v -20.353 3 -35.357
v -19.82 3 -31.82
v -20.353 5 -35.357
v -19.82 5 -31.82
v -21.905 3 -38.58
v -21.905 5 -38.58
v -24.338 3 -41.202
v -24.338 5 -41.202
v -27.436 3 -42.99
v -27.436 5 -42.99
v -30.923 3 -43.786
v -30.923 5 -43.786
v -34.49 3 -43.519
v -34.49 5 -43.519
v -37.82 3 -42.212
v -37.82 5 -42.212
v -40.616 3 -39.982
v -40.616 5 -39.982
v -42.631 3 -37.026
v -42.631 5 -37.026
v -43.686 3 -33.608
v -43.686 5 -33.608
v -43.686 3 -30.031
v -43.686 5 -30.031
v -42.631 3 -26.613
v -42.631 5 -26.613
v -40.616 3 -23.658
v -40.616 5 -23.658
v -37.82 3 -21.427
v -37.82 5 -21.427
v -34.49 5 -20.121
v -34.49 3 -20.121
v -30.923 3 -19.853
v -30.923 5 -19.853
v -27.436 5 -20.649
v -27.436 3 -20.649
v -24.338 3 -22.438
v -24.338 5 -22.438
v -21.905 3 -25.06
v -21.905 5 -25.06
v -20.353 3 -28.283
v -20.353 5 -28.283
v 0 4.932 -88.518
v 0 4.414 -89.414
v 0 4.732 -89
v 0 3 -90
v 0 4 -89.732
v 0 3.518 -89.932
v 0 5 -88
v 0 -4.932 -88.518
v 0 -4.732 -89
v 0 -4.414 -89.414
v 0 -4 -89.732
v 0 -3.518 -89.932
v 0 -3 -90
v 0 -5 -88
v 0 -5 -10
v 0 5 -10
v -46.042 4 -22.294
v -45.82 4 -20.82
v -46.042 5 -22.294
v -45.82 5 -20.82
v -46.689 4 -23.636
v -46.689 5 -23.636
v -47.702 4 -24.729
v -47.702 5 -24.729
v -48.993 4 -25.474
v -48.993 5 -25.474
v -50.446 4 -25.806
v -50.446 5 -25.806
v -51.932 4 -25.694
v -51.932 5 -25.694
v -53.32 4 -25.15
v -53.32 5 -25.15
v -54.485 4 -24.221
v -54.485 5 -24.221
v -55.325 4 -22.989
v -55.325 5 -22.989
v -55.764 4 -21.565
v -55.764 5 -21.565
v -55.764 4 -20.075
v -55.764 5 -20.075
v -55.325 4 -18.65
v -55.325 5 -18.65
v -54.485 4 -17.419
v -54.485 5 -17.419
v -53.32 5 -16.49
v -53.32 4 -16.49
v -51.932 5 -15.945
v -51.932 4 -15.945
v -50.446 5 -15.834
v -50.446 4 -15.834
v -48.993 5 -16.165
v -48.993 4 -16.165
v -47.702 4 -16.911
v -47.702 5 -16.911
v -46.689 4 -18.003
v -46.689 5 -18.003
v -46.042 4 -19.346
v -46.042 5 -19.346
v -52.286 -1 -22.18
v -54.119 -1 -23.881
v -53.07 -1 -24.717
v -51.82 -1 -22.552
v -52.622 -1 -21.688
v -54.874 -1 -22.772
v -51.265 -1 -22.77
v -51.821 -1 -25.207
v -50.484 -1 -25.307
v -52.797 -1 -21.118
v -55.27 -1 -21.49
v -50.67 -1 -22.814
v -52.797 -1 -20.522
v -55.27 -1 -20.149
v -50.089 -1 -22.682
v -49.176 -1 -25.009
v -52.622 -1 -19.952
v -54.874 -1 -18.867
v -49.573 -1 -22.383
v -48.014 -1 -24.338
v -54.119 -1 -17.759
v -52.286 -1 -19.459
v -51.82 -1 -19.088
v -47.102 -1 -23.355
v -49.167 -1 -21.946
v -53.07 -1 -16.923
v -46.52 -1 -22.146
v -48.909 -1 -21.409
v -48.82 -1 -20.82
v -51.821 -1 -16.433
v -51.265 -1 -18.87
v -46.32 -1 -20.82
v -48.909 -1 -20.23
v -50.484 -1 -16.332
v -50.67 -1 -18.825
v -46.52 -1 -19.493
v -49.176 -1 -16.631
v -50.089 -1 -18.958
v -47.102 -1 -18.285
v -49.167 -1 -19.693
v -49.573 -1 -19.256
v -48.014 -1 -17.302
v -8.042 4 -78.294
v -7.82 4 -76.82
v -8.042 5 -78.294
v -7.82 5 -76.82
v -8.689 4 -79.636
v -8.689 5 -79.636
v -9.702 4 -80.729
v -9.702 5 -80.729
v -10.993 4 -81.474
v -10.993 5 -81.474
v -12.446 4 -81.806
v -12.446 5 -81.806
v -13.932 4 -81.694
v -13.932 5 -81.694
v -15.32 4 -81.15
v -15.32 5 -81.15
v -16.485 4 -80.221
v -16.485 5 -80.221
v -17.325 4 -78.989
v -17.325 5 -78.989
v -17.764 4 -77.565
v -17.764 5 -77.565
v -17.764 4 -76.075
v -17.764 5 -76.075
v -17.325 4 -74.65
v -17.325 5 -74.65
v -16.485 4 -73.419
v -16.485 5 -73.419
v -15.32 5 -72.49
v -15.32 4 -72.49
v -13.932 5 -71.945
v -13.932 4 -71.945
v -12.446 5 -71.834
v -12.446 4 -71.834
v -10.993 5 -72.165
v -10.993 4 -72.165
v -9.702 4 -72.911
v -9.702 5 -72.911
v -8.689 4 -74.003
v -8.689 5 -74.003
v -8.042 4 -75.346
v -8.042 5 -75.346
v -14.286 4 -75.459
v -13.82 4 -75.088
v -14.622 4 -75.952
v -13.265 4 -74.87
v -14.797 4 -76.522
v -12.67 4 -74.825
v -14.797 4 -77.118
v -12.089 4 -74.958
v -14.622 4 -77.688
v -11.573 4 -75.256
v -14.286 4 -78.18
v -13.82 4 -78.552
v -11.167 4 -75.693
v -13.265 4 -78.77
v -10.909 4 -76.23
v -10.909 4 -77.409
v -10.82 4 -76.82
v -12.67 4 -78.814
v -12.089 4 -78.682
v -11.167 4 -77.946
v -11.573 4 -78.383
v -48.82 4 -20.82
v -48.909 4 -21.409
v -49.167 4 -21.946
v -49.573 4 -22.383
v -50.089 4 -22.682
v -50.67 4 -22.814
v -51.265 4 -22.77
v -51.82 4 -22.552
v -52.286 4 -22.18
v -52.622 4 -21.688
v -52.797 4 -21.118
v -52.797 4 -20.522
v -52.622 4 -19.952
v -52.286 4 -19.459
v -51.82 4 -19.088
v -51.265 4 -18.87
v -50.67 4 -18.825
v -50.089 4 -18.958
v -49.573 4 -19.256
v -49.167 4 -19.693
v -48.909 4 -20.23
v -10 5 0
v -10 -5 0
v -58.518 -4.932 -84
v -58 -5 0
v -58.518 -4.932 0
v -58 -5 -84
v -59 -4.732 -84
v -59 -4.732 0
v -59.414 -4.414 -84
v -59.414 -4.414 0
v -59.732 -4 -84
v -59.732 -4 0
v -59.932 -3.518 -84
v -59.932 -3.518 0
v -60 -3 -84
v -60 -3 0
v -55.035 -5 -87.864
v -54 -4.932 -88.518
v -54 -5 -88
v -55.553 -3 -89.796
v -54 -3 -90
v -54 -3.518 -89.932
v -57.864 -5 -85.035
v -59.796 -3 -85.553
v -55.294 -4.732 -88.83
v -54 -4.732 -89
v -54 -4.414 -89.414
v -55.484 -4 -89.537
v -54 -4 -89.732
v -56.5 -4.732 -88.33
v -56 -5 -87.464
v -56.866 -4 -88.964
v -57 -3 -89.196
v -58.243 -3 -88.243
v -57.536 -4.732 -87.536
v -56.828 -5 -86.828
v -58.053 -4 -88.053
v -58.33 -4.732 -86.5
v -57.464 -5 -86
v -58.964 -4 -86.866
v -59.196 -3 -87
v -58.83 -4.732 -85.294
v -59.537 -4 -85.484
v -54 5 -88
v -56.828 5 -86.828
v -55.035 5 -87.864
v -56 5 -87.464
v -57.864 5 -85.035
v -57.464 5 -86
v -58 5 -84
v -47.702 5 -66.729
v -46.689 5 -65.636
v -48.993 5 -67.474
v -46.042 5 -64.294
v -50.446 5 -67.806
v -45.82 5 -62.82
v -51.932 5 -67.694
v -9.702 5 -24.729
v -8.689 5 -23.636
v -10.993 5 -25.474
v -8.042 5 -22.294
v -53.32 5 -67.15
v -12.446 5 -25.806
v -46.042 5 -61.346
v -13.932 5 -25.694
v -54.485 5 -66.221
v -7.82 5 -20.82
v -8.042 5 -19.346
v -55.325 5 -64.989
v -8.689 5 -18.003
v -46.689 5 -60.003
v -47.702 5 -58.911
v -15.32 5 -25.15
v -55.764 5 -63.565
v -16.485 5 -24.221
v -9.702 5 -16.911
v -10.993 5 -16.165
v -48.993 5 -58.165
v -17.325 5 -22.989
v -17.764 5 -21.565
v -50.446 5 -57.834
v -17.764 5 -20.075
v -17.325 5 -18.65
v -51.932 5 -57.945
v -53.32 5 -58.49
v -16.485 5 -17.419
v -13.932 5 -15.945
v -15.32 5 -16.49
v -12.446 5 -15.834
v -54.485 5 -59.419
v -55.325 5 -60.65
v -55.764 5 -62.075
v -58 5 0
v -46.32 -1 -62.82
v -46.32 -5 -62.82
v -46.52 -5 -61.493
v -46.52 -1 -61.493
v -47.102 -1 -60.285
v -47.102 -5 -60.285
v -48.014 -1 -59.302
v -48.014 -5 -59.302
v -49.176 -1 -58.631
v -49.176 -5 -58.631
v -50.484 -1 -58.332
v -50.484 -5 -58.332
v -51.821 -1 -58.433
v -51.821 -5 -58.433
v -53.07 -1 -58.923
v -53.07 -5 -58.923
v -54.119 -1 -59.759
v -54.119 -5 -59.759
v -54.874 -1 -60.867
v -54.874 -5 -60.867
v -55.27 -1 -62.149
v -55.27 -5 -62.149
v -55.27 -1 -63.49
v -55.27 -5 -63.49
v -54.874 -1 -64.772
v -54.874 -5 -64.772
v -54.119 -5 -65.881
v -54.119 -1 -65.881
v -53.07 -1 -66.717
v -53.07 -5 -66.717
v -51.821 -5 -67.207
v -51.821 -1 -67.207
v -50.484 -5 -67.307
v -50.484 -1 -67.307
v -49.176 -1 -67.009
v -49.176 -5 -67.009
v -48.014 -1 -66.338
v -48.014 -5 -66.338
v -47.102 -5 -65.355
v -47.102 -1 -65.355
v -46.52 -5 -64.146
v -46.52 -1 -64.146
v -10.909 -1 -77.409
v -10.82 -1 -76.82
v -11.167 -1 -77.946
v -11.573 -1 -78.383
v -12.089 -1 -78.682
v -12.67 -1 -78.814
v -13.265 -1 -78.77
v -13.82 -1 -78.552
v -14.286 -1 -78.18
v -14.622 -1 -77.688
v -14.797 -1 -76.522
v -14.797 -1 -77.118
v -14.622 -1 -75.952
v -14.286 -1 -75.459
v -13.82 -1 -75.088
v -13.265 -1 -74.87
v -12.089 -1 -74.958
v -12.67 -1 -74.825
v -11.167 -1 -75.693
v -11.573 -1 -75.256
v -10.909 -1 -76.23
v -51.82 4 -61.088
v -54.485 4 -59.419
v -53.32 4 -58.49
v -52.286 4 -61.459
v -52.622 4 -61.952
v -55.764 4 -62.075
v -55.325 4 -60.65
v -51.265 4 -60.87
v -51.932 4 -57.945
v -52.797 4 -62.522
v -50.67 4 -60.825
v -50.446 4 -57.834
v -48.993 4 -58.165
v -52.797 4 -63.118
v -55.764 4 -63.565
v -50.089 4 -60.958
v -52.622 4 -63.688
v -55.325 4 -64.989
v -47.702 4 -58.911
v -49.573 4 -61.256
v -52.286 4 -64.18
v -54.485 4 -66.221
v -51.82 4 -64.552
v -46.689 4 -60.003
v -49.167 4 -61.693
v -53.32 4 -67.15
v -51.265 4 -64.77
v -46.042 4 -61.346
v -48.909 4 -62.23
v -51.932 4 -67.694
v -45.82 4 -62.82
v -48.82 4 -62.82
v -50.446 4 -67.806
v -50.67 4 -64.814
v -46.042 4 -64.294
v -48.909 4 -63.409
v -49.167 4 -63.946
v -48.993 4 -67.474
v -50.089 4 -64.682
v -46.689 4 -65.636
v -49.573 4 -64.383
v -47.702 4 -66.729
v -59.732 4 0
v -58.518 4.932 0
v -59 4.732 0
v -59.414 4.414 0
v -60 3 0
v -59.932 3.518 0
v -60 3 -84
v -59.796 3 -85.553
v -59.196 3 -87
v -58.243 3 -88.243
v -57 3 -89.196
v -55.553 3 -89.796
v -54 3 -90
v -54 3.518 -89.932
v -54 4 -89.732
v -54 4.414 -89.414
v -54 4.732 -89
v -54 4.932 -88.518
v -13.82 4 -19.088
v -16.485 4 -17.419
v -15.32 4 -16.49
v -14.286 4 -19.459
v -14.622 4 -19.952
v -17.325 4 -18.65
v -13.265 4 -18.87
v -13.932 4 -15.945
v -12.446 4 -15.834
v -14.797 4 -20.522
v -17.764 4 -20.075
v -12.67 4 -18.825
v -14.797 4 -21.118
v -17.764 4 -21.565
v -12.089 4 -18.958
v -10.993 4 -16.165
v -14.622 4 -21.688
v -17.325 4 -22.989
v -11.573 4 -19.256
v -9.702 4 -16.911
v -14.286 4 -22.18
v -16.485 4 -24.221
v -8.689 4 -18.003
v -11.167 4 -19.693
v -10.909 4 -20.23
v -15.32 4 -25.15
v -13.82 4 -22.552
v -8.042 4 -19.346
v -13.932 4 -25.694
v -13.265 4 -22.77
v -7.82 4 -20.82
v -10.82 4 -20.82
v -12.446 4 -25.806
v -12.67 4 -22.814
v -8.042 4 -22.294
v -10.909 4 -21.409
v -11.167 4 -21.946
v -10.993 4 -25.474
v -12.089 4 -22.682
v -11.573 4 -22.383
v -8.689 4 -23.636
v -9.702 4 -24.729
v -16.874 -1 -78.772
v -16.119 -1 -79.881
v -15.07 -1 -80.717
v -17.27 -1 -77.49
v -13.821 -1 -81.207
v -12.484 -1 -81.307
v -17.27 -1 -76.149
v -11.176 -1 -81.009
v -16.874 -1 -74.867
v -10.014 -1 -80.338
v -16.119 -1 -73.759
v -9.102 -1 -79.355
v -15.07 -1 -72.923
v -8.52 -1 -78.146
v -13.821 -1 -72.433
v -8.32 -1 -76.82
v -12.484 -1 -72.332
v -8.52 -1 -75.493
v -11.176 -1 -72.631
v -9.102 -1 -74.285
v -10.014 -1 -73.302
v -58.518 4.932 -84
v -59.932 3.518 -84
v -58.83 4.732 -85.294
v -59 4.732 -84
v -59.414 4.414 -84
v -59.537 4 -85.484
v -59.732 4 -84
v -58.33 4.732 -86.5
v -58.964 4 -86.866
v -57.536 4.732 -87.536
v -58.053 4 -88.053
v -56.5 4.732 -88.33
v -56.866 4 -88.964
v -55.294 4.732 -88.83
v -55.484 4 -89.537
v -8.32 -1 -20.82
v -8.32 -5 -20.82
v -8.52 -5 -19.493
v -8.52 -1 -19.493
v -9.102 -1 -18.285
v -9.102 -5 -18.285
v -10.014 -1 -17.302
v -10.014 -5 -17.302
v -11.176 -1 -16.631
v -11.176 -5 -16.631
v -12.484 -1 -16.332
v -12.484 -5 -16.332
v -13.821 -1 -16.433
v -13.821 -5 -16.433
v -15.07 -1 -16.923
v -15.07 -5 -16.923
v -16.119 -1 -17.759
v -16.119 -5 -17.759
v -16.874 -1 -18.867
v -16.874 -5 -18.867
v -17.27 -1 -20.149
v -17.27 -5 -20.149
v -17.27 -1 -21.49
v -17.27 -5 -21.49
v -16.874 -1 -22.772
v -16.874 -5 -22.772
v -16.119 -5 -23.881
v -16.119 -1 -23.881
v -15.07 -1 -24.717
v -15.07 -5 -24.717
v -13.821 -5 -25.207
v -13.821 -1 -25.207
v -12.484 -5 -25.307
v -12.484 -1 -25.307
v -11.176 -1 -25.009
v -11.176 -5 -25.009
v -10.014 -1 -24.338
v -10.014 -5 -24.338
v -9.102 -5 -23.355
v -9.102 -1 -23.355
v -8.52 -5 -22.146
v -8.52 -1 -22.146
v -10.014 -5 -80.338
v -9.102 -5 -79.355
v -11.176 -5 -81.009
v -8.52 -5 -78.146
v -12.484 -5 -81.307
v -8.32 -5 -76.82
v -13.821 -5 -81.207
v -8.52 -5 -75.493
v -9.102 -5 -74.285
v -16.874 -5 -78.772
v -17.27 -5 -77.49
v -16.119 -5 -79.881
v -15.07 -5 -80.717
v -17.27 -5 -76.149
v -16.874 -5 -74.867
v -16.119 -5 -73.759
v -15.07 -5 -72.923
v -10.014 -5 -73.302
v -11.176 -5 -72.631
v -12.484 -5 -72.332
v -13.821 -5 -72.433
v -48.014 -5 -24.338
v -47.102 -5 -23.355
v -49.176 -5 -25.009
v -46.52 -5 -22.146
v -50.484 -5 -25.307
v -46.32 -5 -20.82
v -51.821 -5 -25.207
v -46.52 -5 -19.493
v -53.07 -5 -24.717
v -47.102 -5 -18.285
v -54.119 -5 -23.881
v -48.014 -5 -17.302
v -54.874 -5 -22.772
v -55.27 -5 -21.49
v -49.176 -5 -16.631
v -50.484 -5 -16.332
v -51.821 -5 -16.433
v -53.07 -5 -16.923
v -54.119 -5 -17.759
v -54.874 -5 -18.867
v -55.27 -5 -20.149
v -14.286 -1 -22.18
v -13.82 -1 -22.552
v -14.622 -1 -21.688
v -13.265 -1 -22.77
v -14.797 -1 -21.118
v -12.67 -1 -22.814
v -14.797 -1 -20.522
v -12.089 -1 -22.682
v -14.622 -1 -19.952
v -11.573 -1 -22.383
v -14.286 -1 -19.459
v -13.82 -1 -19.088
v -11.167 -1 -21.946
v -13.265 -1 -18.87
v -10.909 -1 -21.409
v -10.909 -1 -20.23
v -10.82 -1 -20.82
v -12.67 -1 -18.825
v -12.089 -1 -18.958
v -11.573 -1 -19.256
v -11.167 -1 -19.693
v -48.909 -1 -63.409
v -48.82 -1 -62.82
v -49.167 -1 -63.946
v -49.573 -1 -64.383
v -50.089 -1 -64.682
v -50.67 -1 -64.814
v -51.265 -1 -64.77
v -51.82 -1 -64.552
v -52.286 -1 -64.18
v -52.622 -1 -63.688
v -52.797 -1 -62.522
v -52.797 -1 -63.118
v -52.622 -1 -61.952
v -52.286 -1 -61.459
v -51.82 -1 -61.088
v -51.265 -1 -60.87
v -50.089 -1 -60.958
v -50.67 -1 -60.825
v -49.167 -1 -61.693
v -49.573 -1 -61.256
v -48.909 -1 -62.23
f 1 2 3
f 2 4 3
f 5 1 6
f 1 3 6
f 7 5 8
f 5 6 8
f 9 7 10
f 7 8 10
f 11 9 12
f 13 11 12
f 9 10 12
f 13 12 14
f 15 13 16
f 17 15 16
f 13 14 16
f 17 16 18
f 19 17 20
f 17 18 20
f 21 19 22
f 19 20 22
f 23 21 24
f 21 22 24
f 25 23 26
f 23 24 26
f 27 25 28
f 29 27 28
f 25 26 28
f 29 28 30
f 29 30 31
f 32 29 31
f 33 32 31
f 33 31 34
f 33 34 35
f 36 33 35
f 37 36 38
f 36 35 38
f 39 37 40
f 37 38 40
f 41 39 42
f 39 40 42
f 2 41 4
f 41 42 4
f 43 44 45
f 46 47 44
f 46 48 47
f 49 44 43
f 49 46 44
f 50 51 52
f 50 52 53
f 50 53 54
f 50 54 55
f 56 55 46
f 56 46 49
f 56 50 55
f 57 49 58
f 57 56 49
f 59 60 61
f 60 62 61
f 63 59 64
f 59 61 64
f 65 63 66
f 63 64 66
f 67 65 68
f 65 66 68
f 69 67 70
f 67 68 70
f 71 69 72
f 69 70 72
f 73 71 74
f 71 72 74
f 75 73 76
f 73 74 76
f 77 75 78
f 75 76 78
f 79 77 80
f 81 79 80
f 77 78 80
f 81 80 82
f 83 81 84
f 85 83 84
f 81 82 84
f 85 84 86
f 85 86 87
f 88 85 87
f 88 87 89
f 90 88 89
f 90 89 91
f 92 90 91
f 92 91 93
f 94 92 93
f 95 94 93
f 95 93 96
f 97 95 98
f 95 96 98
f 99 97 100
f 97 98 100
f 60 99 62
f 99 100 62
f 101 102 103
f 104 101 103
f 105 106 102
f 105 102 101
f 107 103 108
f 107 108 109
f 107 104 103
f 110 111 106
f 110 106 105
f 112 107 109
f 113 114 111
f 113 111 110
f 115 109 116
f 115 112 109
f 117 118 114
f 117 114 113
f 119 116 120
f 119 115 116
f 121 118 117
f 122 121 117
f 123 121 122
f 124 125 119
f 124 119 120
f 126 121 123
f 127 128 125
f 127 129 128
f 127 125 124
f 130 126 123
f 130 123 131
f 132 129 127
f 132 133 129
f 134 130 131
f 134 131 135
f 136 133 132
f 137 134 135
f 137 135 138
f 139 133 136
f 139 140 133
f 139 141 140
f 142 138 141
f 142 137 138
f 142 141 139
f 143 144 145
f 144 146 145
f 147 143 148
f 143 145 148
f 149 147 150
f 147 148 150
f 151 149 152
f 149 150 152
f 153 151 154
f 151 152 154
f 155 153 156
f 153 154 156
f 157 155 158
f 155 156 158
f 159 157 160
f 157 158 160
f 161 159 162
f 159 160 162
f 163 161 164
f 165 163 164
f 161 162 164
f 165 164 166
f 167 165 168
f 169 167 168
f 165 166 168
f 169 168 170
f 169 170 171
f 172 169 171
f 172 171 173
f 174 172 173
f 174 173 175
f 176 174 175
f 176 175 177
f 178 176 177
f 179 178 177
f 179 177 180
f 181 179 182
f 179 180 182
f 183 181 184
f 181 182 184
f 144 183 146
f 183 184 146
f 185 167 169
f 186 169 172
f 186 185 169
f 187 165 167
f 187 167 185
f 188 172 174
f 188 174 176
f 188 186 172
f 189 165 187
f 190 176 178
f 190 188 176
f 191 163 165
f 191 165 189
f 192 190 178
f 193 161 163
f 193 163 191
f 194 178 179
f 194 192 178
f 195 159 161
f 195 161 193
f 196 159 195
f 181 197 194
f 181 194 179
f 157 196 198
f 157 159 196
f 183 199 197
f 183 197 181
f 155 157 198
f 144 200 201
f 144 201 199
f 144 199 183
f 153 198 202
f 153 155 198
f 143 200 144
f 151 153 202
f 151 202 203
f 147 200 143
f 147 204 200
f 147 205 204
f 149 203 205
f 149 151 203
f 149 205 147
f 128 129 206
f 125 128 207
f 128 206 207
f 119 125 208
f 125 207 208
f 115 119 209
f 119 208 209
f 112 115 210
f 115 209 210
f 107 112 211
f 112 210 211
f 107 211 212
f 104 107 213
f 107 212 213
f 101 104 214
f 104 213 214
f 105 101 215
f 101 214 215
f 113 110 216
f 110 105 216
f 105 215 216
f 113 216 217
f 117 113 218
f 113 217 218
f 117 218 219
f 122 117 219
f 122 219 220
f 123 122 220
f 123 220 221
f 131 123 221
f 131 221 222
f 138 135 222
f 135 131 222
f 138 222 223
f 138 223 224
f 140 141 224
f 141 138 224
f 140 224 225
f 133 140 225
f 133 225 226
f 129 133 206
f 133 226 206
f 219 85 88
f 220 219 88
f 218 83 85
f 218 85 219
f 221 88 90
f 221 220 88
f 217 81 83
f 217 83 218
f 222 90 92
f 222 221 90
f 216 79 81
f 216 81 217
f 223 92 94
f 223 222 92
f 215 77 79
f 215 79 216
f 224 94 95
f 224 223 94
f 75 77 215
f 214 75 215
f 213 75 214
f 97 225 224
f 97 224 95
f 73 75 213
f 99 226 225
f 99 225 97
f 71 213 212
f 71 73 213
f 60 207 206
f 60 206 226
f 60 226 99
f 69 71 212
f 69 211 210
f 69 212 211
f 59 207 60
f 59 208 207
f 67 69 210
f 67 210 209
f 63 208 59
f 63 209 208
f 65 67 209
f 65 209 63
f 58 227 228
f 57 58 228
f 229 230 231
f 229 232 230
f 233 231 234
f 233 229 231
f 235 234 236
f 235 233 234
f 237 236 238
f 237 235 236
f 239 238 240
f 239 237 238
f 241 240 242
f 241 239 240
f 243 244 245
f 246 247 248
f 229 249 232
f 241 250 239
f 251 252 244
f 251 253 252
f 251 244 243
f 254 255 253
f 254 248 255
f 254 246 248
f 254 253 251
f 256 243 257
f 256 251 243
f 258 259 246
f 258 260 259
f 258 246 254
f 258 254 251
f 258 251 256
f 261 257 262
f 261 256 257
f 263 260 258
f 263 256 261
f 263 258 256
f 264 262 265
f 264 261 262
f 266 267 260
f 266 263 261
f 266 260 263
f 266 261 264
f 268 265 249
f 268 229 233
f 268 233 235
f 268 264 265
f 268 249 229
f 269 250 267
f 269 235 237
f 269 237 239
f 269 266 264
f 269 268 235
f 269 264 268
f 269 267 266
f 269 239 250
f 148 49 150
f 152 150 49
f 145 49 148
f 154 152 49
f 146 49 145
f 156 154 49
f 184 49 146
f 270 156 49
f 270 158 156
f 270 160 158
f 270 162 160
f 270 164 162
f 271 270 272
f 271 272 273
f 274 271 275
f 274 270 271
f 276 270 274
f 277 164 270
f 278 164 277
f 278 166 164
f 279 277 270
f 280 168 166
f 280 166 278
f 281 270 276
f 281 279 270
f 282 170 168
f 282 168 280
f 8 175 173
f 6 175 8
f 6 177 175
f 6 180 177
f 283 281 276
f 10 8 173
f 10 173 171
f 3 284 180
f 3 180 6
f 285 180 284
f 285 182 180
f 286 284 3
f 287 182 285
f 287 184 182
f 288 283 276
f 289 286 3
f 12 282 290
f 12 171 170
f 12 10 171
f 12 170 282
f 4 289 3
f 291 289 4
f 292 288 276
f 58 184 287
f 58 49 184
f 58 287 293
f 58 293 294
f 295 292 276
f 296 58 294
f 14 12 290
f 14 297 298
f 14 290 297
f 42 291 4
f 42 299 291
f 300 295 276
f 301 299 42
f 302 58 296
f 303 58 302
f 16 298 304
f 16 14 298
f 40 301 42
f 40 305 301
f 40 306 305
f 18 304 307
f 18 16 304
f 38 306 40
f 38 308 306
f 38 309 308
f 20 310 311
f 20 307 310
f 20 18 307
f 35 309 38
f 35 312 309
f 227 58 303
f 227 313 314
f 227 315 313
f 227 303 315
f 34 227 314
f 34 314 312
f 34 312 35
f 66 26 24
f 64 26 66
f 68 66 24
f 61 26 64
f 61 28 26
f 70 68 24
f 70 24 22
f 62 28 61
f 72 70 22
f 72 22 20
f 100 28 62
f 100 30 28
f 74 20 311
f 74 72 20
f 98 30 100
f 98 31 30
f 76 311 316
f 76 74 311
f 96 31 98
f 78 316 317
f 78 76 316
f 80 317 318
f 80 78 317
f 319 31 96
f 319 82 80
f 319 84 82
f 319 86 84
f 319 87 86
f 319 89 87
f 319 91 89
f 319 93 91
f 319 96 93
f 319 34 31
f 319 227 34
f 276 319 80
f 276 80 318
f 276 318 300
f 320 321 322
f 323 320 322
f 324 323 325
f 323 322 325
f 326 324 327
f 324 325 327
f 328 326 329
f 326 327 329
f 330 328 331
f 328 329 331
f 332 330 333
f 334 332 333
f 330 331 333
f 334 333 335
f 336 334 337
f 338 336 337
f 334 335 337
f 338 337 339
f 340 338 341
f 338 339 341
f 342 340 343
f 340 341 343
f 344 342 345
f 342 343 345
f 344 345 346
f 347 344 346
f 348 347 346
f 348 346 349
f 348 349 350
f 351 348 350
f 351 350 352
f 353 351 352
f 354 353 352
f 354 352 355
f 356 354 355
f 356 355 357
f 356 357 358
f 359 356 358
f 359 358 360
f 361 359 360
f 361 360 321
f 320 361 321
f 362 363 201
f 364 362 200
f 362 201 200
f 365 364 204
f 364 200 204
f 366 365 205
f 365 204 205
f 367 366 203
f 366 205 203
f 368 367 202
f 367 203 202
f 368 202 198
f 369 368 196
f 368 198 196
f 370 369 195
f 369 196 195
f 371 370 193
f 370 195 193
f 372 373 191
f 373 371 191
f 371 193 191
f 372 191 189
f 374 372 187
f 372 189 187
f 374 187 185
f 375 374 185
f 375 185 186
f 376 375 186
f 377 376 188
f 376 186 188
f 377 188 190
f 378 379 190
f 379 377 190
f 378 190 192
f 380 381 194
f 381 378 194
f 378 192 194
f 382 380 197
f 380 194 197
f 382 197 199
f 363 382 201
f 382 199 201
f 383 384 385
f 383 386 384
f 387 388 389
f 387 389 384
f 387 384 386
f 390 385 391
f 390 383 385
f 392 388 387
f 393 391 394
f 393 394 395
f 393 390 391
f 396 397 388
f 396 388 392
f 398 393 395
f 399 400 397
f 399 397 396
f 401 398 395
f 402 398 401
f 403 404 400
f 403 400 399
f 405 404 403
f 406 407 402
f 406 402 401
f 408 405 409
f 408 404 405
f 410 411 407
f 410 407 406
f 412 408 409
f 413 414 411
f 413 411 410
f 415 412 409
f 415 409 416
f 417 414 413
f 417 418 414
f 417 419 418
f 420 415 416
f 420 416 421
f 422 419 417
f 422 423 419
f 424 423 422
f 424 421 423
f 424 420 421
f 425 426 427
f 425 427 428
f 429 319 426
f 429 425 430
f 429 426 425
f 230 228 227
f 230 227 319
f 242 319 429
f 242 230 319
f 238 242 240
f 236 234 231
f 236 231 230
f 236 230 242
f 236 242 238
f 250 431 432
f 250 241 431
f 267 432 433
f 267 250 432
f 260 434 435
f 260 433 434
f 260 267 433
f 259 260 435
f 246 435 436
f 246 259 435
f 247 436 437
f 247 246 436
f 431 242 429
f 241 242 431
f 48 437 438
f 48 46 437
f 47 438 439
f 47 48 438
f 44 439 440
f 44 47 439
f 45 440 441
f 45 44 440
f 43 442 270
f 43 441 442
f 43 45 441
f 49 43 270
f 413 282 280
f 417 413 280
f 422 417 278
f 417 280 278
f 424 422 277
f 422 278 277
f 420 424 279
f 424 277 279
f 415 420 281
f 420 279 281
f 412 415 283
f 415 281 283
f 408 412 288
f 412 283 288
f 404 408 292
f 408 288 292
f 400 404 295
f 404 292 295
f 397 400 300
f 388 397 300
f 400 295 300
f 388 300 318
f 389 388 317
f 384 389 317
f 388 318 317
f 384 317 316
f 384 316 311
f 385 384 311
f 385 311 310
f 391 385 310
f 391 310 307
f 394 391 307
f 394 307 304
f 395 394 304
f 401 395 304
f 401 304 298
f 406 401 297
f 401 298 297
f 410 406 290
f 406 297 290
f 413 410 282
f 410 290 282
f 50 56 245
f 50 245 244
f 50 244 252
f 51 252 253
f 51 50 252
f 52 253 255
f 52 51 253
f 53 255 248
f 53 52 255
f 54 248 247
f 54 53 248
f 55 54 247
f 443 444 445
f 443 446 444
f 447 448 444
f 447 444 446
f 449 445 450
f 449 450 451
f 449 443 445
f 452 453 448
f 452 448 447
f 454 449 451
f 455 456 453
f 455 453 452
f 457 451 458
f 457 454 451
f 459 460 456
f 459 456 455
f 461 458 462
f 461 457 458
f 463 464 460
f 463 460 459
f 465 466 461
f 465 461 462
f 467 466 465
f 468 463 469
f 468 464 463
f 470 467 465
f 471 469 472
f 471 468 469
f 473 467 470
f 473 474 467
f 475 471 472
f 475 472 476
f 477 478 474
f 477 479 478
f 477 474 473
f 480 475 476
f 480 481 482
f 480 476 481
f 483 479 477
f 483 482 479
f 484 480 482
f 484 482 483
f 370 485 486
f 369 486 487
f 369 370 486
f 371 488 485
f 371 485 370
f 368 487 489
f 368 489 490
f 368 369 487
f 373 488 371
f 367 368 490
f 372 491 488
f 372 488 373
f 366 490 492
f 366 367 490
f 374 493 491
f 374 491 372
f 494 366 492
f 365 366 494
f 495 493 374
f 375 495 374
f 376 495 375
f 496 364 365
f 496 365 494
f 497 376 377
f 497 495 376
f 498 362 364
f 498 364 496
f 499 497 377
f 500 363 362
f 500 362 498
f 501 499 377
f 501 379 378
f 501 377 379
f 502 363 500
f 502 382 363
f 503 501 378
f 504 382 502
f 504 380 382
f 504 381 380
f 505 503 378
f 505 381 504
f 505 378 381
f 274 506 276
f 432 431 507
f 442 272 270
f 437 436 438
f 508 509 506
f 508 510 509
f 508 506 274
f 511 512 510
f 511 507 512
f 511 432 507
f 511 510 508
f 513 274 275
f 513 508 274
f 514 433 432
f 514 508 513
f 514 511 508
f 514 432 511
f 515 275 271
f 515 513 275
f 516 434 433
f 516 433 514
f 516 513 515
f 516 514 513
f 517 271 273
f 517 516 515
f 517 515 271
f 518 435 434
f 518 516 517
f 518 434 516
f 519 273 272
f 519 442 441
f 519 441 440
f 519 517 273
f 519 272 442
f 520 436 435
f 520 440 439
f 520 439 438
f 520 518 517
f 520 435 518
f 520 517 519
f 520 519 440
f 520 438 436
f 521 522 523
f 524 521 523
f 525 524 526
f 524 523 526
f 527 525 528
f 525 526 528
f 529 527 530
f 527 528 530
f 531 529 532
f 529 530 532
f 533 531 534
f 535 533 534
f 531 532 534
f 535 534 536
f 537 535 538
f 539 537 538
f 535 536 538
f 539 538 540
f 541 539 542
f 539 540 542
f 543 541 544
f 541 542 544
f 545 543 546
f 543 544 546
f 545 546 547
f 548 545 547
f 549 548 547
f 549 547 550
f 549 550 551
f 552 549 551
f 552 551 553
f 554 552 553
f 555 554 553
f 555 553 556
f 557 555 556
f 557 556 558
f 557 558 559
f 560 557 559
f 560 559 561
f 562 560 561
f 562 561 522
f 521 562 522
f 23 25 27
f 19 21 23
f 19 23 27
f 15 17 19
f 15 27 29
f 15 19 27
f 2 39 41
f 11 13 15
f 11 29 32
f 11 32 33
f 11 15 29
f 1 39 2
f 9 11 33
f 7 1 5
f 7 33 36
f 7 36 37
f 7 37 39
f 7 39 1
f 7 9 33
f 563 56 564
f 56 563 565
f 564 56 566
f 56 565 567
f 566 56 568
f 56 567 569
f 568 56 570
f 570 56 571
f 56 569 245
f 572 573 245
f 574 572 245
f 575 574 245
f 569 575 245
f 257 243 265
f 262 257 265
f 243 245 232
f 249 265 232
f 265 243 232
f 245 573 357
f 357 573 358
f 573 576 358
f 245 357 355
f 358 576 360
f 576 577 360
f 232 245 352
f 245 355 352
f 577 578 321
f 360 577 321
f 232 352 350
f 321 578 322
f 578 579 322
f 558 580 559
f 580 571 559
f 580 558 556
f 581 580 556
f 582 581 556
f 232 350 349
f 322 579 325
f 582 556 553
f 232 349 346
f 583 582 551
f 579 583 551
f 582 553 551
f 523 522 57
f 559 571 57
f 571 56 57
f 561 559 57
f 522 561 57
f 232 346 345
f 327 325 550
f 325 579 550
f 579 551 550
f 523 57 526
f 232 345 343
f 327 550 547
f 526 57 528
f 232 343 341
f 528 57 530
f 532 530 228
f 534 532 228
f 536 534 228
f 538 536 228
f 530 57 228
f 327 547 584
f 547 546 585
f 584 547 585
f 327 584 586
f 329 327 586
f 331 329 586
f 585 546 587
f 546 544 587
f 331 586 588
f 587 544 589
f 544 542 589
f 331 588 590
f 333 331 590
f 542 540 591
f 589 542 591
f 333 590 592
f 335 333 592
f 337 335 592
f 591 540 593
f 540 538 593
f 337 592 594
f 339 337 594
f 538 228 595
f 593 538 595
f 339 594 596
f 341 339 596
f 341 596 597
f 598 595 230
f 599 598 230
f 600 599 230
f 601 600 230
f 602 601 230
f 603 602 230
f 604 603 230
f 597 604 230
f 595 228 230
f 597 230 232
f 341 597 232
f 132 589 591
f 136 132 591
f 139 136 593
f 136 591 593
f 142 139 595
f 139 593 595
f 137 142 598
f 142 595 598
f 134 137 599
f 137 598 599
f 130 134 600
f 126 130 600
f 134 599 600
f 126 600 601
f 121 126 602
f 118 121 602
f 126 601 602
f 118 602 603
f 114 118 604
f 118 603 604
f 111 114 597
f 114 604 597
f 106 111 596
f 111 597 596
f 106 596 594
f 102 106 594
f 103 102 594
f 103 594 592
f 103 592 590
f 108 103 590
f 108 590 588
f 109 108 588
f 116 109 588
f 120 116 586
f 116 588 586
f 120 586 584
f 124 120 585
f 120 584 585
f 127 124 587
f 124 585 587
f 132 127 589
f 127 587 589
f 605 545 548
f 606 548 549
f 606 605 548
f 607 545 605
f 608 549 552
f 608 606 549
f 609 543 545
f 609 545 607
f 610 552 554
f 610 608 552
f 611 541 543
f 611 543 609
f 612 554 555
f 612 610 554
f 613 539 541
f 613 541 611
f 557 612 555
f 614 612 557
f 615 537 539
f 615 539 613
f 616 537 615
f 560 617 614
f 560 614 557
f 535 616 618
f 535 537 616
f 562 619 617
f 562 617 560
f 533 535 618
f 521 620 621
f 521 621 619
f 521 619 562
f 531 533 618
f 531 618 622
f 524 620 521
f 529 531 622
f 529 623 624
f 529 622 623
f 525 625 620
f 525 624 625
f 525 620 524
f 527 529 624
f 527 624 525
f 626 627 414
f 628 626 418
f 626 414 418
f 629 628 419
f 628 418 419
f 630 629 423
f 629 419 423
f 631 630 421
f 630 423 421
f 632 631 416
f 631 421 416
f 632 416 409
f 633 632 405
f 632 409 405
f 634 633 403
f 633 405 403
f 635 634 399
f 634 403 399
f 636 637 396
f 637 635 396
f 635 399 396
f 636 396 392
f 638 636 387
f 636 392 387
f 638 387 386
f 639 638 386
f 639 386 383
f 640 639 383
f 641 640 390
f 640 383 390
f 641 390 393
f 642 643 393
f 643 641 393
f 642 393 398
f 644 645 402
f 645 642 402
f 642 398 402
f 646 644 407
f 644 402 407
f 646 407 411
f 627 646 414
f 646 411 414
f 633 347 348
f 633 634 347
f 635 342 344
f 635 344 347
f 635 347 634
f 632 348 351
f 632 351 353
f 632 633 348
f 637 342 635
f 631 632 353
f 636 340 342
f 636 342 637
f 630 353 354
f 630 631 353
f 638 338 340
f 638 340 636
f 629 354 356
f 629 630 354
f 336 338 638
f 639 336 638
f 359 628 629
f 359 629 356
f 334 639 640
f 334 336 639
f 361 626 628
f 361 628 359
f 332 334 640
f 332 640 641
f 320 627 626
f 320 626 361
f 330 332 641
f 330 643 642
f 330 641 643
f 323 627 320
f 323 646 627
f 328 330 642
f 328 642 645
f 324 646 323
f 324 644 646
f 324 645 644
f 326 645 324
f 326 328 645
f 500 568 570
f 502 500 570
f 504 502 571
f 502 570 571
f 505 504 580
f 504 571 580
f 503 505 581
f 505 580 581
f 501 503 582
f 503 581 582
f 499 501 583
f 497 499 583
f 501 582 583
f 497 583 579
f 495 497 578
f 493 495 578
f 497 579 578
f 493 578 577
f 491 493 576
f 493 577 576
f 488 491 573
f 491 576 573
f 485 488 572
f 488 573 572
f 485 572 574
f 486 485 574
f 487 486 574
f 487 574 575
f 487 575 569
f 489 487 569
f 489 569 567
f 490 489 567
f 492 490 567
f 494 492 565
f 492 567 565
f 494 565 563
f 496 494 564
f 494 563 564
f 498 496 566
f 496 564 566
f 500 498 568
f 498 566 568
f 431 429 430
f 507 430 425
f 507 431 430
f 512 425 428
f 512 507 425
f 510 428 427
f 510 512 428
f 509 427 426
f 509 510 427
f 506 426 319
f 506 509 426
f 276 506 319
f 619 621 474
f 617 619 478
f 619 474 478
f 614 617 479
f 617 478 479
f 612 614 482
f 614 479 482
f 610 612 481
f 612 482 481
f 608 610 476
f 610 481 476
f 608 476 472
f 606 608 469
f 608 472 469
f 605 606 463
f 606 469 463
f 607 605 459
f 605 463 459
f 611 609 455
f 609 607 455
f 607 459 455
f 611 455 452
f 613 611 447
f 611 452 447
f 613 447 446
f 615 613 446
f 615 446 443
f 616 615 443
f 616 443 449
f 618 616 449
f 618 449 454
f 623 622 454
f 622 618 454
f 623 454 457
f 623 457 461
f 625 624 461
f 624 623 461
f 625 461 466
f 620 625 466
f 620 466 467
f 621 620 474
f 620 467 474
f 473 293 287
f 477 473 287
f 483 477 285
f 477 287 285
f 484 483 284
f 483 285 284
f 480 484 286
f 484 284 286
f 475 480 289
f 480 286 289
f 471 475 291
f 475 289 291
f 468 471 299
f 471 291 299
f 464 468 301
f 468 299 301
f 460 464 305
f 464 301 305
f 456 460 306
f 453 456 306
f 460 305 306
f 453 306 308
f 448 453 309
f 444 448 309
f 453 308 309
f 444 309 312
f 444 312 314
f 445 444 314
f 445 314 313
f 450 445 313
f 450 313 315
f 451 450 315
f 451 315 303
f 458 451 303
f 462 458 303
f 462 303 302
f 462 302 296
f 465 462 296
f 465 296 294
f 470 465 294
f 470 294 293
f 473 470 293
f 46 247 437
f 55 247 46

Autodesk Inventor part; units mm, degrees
ref_plane "YZ Plane" through (0, 0, 0) normal (1, 0, 0) x (0, 1, 0)
ref_plane "XZ Plane" through (0, 0, 0) normal (0, 1, 0) x (-1, 0, 0)
ref_plane "XY Plane" through (0, 0, 0) normal (0, 0, 1) x (1, 0, 0)
sketch "Sketch2" plane through (0, 0, 0) normal (0, 1, 0) x (-1, 0, 0)
  line L0 (0, 0) -> (60, 0)
  line L1 (60, 0) -> (60, -90)
  line L2 (60, -90) -> (0, -90)
  line L3 (0, -90) -> (0, 0)
  dimension "d5" = 60
  dimension "d6" = 90
extrude "Extrusion1" add sketch "Sketch2" along normal mid plane 10
sketch "Sketch3" plane through (0, 5, 0) normal (0, 1, 0) x (1, 0, 0)
  line L0 (-60, 0) -> (0, 0) construction
  line L1 (0, 0) -> (-31.8198, 31.8198) construction
  line L2 (0, 0) -> (45, 0) construction
  circle A0 centre (-31.8198, 31.8198) radius 12
  dimension "d9" = 45
  dimension "d10" = 135
  dimension "d11" = 24
extrude "Extrusion2" cut sketch "Sketch3" against normal blind 2
chamfer "Chamfer1" distance 10 angle 45 1 edges at (0, 0, 0)
fillet "Fillet1" radius 6 1 edges at (-60, 0, -90)
fillet "Fillet1" radius 2 4 edges at (-30, 5, -90) (-30, -5, -90) (-60, -5, -45) (-60, 5, -45)
sketch "Sketch4" plane through (0, 5, 0) normal (0, 1, 0) x (1, 0, 0)
  circle A0 centre (-31.8198, 31.8198) radius 12 projected
  line L0 (-31.8198, 31.8198) -> (-12.8198, 31.8198) construction
  line L1 (-12.8198, 31.8198) -> (-12.8198, 20.8198) construction
  circle A1 centre (-12.8198, 20.8198) radius 2
  line L2 (-31.8198, 31.8198) -> (-31.8198, 62.8198) construction
  line L3 (-31.8198, 31.8198) -> (-31.8198, 76.8198) construction
  circle A2 centre (-50.8198, 20.8198) radius 2
  line L4 (-31.8198, 76.8198) -> (-12.8198, 76.8198) construction
  line L5 (-31.8198, 62.8198) -> (-50.8198, 62.8198) construction
  circle A3 centre (-12.8198, 76.8198) radius 2
  circle A4 centre (-50.8198, 62.8198) radius 2
  point P0 (0, 0)
  dimension "d19" = 19
  dimension "d20" = 11
  dimension "d21" = 4
  dimension "d22" = 31
  dimension "d30" = 19
  dimension "d32" = 19
  dimension "d33" = 45
  dimension "d34" = 4
  dimension "d35" = 4
extrude "Extrusion4" cut sketch "Sketch4" against normal up to surface (10 mm away) contours A1 | A2 | A3 | A4
sketch "Sketch6" plane through (0, -5, 0) normal (0, -1, 0) x (1, 0, 0)
  circle A0 centre (-50.8198, -20.8198) radius 2 projected
  circle A1 centre (-12.8198, -20.8198) radius 2 projected
  circle A2 centre (-50.8198, -62.8198) radius 2 projected
  circle A3 centre (-12.8198, -76.8198) radius 2 projected
  circle A4 centre (-50.8198, -20.8198) radius 2 projected
  circle A5 centre (-50.8198, -20.8198) radius 4.5
  circle A6 centre (-12.8198, -20.8198) radius 2 projected
  circle A7 centre (-12.8198, -20.8198) radius 4.5
  circle A8 centre (-50.8198, -62.8198) radius 4.5
  circle A9 centre (-12.8198, -76.8198) radius 2 projected
  circle A10 centre (-12.8198, -76.8198) radius 4.5
  point P0 (0, 0)
  dimension "d45" = 9
  dimension "d46" = 9
  dimension "d47" = 9
  dimension "d48" = 9
extrude "Extrusion6" cut sketch "Sketch6" against normal blind 4
sketch "Sketch7" plane through (0, 5, 0) normal (0, 1, 0) x (1, 0, 0)
  circle A0 centre (-12.8198, 20.8198) radius 2 projected
  circle A1 centre (-50.8198, 20.8198) radius 2 projected
  circle A2 centre (-50.8198, 62.8198) radius 2 projected
  circle A3 centre (-12.8198, 76.8198) radius 2 projected
  circle A4 centre (-12.8198, 20.8198) radius 2 projected
  circle A5 centre (-12.8198, 20.8198) radius 5
  circle A6 centre (-50.8198, 20.8198) radius 5
  circle A7 centre (-12.8198, 76.8198) radius 5
  circle A8 centre (-50.8198, 62.8198) radius 5
  point P0 (0, 0)
  dimension "d51" = 10
  dimension "d52" = 10
  dimension "d53" = 10
  dimension "d54" = 10
extrude "Extrusion7" cut sketch "Sketch7" against normal blind 1
thread "Thread1" size "M4x0.7" class "6H" standard "ANSI Metric M Profile" full length
thread "Thread2" size "M4x0.7" class "6H" standard "ANSI Metric M Profile" full length
thread "Thread3" size "M4x0.7" class "6H" standard "ANSI Metric M Profile" full length
thread "Thread4" size "M4x0.7" class "6H" standard "ANSI Metric M Profile" full length
properties part number "bearing bracket for bolt screw"
